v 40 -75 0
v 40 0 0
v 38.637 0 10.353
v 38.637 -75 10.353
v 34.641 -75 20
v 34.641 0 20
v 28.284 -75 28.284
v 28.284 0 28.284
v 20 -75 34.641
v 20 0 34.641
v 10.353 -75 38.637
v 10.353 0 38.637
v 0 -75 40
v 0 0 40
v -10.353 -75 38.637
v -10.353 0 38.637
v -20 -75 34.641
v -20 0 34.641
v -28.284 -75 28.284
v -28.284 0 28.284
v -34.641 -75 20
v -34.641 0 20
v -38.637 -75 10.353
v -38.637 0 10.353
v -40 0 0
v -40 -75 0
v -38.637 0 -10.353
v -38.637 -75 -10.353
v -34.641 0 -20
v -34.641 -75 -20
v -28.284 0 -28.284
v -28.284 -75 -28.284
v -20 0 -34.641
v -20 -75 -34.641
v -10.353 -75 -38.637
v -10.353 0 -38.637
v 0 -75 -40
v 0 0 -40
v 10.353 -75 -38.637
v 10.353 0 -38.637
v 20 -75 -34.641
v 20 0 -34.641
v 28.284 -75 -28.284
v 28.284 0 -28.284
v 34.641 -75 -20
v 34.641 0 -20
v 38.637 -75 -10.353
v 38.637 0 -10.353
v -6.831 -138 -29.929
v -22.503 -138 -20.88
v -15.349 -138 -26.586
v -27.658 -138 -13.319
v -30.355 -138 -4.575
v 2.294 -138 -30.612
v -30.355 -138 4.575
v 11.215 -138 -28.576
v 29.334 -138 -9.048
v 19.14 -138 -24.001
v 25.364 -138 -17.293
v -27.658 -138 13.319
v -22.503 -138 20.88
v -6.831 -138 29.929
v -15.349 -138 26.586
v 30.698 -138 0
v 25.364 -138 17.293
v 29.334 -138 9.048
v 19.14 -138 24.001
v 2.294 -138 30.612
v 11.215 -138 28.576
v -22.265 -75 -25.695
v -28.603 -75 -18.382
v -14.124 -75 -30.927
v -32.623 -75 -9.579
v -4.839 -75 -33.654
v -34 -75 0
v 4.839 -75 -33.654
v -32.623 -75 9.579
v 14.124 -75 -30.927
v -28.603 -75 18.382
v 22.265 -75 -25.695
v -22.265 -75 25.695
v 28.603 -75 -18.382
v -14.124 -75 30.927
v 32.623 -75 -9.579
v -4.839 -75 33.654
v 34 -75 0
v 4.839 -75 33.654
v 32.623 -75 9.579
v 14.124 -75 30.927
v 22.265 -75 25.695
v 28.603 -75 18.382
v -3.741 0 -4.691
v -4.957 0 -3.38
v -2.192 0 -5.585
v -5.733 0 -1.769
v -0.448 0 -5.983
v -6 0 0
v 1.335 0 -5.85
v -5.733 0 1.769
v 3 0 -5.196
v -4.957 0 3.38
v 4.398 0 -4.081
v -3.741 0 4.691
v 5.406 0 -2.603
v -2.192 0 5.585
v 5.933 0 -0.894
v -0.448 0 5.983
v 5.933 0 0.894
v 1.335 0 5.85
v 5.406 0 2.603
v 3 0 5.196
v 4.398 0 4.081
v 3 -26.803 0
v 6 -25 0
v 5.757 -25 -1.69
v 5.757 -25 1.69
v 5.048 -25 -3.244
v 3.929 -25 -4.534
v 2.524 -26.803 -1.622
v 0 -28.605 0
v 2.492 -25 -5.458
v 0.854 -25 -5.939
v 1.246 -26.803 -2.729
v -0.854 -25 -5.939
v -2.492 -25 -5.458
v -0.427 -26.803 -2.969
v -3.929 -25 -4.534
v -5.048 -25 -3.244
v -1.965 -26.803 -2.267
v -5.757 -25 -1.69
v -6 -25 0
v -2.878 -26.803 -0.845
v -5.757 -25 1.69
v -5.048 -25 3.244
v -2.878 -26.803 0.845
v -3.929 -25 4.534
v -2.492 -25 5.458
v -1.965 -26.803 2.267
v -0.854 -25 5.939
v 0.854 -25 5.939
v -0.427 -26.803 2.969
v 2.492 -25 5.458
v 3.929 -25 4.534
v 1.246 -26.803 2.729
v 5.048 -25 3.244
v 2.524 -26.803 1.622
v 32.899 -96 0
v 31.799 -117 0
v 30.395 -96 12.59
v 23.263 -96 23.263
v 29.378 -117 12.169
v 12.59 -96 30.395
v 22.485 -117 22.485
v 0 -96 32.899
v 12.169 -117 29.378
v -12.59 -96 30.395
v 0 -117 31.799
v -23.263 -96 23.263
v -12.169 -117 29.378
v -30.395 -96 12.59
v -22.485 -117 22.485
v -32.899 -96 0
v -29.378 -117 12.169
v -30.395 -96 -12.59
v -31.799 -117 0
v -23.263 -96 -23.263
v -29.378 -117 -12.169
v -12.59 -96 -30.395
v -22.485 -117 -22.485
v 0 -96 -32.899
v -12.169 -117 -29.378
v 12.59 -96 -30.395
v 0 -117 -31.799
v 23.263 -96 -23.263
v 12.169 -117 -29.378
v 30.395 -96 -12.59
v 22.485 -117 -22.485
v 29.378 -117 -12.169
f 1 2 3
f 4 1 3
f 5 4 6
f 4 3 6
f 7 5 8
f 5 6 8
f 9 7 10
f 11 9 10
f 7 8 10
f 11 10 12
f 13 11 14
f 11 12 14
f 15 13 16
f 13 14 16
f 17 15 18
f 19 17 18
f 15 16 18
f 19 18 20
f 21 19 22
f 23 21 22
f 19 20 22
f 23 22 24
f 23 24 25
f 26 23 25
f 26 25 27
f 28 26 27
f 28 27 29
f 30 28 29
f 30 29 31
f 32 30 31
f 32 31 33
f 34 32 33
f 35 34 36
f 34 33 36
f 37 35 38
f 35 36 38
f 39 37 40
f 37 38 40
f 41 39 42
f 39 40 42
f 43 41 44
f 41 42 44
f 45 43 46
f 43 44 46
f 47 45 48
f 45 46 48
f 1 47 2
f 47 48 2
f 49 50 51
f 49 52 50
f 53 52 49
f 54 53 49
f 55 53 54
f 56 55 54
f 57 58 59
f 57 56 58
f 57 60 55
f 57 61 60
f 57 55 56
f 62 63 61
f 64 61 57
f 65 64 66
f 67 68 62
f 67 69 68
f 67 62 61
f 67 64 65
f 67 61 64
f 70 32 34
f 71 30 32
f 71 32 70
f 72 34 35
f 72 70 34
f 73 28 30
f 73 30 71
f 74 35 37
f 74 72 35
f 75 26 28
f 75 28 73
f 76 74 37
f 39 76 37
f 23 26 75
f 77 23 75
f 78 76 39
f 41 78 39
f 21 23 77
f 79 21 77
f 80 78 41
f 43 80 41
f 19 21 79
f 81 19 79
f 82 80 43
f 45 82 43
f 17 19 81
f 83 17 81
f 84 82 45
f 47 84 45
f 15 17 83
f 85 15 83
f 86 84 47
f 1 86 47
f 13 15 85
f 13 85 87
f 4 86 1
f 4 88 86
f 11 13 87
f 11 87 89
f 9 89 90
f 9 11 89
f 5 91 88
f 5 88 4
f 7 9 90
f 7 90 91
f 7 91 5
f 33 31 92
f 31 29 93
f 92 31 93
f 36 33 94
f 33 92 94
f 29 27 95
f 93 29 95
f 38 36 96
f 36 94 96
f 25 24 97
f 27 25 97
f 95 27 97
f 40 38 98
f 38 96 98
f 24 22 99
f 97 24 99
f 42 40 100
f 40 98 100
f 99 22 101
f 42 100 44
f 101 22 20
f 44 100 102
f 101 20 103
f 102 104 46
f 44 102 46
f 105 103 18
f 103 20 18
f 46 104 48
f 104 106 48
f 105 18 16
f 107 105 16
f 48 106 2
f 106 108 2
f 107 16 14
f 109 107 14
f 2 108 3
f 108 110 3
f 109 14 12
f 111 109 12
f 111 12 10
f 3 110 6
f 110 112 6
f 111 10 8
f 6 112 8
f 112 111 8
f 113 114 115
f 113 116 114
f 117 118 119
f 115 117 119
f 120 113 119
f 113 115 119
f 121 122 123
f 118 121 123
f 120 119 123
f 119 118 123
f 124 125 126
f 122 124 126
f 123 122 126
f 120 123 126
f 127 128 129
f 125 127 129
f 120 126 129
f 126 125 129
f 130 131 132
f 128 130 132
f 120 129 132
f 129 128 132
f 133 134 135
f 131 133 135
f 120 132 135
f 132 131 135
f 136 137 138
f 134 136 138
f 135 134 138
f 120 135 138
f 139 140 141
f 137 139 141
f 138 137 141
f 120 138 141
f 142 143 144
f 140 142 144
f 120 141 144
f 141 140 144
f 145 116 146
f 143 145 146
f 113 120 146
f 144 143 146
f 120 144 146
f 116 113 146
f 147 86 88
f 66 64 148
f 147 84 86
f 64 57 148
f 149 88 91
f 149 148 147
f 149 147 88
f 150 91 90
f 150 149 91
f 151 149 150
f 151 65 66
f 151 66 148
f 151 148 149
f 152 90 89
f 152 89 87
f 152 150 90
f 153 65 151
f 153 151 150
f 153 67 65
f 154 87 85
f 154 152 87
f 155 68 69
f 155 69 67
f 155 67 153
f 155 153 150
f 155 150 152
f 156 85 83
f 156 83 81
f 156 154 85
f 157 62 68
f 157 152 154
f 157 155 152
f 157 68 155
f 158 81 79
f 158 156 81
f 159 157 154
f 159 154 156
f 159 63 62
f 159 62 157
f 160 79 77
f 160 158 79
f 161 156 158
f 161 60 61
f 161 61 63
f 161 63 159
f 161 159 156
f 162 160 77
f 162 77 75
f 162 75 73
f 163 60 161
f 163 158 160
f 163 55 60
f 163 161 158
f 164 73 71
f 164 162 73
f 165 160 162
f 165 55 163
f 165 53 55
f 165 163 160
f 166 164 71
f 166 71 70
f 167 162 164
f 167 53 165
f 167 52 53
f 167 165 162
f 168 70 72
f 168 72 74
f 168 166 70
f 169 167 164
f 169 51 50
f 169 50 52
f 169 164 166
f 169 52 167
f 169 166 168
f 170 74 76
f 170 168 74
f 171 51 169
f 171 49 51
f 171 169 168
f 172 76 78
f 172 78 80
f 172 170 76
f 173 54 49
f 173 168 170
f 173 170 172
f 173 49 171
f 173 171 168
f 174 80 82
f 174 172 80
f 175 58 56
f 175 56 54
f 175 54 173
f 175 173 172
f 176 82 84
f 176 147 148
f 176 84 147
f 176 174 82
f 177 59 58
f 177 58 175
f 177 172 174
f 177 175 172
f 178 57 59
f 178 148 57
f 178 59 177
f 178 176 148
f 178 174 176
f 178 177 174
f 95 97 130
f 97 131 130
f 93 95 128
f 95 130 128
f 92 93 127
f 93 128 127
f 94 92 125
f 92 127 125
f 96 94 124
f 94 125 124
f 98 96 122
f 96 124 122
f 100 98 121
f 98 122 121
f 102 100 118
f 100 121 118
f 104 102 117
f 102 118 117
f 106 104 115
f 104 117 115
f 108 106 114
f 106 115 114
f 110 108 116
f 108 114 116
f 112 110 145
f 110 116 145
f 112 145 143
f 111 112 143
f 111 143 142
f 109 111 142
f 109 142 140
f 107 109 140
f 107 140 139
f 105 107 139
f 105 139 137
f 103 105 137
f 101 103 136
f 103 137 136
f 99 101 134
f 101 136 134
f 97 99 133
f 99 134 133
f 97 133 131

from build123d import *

# Parameters (mm, degrees)
F0_R     = 40
F1_DEPTH = 75
F2_R     = 34
F3_DEPTH = 63
F3_TAPER = 3
F4_D     = 12
F4_DEPTH = 25
F4_TIP   = 3.6051637142


with BuildPart() as f1:
    # F0 (on Front) → F1 (new body)
    with BuildSketch(Plane.XZ):
        Circle(F0_R)
    extrude(amount=F1_DEPTH)

    # F2 (on face) → F3 (join)
    with BuildSketch(Plane.XZ.offset(75)):
        Circle(F2_R)
    extrude(amount=F3_DEPTH, taper=F3_TAPER)

    # F4
    with Locations(Plane(origin=(0, 0, 0), x_dir=(1, 0, 0), z_dir=(0, 1, 0))):
        with Locations((0, 0)):
            Hole(F4_D / 2, depth=F4_DEPTH)
            with Locations((0, 0, -(F4_DEPTH + F4_TIP / 2))):  # 118° drill point
                Cone(0, F4_D / 2, F4_TIP, mode=Mode.SUBTRACT)


solid = f1.part
